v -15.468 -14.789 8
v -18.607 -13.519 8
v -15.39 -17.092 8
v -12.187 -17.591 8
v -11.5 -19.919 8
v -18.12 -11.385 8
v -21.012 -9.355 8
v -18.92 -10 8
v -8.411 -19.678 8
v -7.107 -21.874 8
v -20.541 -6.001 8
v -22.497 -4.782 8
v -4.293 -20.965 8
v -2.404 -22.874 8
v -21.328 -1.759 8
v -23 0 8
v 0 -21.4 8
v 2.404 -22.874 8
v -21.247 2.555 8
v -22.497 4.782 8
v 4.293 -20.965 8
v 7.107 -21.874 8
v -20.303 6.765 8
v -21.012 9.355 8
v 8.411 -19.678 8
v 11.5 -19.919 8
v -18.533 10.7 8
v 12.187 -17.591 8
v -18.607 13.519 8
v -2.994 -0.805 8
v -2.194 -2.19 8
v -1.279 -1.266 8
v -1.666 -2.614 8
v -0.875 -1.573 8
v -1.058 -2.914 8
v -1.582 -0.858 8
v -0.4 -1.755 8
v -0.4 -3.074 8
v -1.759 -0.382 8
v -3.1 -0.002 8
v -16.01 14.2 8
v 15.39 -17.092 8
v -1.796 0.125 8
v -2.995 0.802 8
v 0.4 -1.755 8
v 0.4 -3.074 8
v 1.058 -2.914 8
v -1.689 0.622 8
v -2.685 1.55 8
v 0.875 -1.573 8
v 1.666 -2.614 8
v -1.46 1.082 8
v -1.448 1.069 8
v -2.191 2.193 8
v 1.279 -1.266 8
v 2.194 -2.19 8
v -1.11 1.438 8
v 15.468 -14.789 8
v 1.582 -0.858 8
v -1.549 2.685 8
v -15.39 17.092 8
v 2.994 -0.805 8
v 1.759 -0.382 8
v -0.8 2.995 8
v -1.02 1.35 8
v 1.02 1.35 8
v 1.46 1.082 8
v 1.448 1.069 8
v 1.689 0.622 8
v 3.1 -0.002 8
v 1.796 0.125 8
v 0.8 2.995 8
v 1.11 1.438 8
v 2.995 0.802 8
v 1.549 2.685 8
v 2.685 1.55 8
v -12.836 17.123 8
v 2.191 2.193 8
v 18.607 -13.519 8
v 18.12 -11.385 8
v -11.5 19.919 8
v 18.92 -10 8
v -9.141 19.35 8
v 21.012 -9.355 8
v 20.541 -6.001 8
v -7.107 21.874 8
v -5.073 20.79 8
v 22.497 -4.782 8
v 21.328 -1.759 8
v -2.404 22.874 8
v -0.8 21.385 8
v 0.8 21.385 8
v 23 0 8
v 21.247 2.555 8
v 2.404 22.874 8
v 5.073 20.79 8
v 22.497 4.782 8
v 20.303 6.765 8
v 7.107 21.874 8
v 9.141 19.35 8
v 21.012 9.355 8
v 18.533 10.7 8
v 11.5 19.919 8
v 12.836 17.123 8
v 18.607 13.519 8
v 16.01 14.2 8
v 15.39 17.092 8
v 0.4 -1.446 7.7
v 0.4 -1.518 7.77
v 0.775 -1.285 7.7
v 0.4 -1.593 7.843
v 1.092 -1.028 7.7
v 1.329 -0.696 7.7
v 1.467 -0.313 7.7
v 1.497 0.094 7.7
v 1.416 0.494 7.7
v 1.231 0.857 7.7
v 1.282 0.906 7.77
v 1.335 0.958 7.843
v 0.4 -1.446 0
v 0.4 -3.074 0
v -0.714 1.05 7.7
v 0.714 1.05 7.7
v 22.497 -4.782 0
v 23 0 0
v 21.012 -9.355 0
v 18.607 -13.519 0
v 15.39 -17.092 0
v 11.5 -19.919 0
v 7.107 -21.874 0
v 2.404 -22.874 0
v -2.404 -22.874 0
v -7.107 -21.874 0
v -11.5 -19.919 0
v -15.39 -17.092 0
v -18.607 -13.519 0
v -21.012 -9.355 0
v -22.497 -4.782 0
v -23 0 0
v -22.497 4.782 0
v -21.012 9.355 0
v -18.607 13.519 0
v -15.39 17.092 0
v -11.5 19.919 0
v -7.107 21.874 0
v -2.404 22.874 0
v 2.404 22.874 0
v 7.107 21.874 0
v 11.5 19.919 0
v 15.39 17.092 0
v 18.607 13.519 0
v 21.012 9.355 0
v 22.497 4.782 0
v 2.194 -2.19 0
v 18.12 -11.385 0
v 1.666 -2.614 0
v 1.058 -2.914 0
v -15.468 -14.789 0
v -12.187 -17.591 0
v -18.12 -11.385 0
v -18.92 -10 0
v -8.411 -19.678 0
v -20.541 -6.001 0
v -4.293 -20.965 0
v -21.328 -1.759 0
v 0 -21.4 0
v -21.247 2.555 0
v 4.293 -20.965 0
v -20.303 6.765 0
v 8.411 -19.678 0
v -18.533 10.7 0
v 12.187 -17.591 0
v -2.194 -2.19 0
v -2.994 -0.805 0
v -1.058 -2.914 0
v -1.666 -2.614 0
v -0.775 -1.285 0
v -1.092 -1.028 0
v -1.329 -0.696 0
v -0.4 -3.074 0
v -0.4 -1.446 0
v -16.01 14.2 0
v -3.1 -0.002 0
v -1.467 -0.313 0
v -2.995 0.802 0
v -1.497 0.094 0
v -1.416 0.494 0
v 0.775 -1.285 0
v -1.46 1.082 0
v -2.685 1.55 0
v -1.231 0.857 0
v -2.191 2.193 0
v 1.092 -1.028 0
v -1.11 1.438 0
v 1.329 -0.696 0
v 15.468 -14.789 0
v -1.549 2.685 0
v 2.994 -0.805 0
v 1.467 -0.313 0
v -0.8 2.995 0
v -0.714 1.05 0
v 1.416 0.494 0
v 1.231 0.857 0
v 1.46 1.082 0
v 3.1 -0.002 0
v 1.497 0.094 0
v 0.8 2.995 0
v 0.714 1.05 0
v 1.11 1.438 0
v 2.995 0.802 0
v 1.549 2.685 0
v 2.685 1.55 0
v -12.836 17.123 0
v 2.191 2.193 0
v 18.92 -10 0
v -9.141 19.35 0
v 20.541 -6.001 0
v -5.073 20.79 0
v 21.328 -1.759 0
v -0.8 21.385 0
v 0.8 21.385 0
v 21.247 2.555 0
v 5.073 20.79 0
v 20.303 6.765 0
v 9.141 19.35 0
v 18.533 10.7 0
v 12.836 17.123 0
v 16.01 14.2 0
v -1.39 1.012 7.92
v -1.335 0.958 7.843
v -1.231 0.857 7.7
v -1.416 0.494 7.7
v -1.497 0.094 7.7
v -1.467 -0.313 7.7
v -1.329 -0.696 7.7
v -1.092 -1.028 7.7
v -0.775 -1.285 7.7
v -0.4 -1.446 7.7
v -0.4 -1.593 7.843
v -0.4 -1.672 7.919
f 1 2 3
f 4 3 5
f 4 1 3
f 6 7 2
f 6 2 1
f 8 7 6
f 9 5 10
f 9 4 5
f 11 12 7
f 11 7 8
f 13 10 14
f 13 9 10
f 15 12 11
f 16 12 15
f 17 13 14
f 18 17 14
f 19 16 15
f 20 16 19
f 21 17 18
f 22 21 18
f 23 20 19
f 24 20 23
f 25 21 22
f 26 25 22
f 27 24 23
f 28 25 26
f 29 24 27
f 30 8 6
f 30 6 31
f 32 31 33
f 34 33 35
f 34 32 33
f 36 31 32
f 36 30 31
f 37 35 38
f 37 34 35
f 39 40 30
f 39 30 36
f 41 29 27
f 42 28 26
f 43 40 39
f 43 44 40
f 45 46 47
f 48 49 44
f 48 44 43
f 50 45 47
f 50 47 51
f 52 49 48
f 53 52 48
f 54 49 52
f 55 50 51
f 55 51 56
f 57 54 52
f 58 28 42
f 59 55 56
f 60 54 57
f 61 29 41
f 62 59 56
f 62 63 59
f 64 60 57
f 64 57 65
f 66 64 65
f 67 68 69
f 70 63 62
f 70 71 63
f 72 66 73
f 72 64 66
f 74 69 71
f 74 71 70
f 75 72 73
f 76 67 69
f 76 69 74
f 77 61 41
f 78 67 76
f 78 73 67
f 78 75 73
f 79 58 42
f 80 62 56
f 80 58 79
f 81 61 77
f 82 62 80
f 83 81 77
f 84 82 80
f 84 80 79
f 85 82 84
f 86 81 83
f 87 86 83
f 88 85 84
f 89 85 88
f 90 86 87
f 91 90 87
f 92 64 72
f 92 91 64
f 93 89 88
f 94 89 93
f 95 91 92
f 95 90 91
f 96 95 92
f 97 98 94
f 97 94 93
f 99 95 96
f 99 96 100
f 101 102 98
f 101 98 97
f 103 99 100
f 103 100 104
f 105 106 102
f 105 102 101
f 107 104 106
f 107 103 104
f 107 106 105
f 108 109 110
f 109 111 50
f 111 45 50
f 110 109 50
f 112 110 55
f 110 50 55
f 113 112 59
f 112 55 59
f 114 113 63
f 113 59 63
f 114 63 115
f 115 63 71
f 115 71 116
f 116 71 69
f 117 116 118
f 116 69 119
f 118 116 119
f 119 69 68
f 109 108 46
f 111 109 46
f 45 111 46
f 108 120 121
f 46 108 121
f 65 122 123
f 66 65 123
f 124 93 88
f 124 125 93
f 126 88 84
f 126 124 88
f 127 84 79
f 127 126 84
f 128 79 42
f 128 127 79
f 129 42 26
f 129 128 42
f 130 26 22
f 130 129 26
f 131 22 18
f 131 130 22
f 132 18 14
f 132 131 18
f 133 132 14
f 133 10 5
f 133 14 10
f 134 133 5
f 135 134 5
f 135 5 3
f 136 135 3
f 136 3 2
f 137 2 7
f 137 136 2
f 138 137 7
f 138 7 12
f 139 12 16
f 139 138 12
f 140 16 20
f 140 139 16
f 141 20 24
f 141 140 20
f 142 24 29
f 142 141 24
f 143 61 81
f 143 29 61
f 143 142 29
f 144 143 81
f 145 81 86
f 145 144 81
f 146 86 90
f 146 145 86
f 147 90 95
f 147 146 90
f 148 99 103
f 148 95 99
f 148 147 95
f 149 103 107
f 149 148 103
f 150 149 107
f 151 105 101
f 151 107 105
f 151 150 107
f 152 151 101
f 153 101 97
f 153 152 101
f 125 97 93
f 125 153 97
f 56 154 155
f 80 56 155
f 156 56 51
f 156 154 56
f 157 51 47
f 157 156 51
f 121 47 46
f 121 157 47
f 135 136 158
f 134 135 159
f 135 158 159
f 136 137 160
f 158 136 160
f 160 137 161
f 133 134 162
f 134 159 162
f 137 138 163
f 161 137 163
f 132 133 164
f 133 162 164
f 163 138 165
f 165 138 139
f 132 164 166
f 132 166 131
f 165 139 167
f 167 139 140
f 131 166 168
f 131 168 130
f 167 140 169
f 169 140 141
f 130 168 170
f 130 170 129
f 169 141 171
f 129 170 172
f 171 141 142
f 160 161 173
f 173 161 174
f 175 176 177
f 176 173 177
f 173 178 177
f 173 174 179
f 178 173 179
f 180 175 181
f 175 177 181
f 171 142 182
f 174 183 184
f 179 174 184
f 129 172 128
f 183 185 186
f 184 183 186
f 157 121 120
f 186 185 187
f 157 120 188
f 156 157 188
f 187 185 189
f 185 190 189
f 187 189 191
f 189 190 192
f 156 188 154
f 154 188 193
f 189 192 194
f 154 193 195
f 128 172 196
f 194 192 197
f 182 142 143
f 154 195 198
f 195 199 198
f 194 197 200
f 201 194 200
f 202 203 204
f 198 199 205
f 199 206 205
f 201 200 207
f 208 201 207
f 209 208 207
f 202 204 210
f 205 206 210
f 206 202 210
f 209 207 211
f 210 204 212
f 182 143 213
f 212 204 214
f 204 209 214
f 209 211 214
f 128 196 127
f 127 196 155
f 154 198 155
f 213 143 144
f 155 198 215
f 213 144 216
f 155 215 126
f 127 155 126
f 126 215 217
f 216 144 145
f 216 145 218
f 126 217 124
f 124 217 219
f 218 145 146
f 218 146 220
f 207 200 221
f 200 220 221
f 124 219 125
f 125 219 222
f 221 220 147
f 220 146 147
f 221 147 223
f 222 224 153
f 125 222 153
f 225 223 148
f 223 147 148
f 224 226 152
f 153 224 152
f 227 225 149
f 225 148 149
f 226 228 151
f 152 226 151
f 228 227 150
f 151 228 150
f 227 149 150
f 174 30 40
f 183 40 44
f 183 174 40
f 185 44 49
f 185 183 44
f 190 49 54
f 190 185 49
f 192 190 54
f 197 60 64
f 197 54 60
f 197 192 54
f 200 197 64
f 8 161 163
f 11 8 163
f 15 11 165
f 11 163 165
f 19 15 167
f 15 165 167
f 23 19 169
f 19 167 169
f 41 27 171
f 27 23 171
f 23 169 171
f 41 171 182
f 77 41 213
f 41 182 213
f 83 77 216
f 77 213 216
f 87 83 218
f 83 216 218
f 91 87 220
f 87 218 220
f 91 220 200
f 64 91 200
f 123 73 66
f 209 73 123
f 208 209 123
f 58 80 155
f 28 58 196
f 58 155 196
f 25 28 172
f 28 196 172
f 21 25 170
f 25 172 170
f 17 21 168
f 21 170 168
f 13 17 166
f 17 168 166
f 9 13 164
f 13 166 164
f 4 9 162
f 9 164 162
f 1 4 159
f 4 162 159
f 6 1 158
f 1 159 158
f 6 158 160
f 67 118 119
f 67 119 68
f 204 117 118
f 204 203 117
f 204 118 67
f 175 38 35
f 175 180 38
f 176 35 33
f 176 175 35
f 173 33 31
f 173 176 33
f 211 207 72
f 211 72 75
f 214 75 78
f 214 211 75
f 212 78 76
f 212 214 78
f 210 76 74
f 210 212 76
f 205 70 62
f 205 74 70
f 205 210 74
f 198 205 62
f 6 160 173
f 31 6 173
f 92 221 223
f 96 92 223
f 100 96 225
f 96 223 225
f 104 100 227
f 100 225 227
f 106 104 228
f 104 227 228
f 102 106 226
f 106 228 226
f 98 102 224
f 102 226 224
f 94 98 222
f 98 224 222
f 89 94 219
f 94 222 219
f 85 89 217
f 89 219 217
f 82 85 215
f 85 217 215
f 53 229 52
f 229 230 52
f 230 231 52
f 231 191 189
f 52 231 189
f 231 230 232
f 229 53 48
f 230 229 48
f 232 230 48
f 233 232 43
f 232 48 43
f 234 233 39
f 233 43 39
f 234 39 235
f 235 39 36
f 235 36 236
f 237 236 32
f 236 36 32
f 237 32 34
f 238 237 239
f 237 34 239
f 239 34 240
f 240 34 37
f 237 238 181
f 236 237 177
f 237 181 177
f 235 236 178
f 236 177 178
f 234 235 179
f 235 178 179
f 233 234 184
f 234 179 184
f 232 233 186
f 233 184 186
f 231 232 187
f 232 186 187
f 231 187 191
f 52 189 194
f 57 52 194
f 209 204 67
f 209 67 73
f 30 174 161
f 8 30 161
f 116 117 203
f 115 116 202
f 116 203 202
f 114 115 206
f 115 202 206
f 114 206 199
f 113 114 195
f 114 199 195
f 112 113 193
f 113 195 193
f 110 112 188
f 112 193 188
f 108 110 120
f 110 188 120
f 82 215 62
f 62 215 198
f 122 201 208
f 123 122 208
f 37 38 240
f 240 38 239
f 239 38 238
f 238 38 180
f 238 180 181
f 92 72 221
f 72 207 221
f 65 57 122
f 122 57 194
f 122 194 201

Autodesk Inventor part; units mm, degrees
ref_plane "YZ Plane" through (0, 0, 0) normal (1, 0, 0) x (0, 1, 0)
ref_plane "XZ Plane" through (0, 0, 0) normal (0, 1, 0) x (-1, 0, 0)
ref_plane "XY Plane" through (0, 0, 0) normal (0, 0, 1) x (1, 0, 0)
sketch "スケッチ1" plane through (0, 0, 0) normal (0, 0, 1) x (1, 0, 0)
  circle A0 centre (0, 0) radius 1.5
  circle A1 centre (0, 0) radius 3.1
  line L0 (-0.4, 0) -> (0.4, 0)
  line L1 (0.4, 0) -> (0.4, -3.1)
  line L2 (0.4, -3.1) -> (-0.4, -3.1)
  line L3 (-0.4, -3.1) -> (-0.4, 0)
  line L4 (-1.0712, 1.05) -> (1.0712, 1.05)
  circle A2 centre (0, 0) radius 23
  circle A3 centre (0, 0) radius 21.4
  line L5 (-1.4605, 1.0815) -> (-1.1105, 1.4385)
  line L6 (-1.1105, 1.4385) -> (0.175, 0.1785)
  line L7 (0.175, 0.1785) -> (-0.175, -0.1785)
  line L8 (-0.175, -0.1785) -> (-1.4605, 1.0815)
  line L9 (1.4605, 1.0815) -> (1.1105, 1.4385)
  line L10 (1.1105, 1.4385) -> (-0.175, 0.1785)
  line L11 (-0.175, 0.1785) -> (0.175, -0.1785)
  line L12 (0.175, -0.1785) -> (1.4605, 1.0815)
  line L13 (0, 0) -> (-1.0712, 1.05) construction
  line L14 (1.0712, 1.05) -> (0, 0) construction
  point P0 (0.4, -1.4457)
  point P1 (0.4, -3.0741)
  point P2 (-0.4, -3.0741)
  point P3 (-0.4, -1.4457)
  point P4 (-0.7141, 1.05)
  point P5 (0.7141, 1.05)
  point P6 (1.2312, 0.8568)
  point P7 (-1.2312, 0.8568)
  dimension "SHAFT_D" = 3
  dimension "SLIT" = 0.8
  dimension "HUB_THIN" = 1.6
  dimension "d3" = 1.05
  dimension "WHEEL_D" = 46
  dimension "d5" = 1.6
  dimension "d18" = 0.5
  dimension "d19" = 1.8
extrude "ハブ＆リム" add sketch "スケッチ1" along normal blind 8 contours A0 L12 L9 L10 L6 L5 L8 L3 A1 L1 | L10 L4 L6 A0 | A2
sketch "スケッチ2" plane through (0, 0, 0) normal (0, 0, 1) x (1, 0, 0)
  line L0 (-0.8, 2.6) -> (0.8, 2.6)
  line L1 (0.8, 2.6) -> (0.8, 21.4)
  line L2 (0.8, 21.4) -> (-0.8, 21.4)
  line L3 (-0.8, 21.4) -> (-0.8, 2.6)
  circle A0 centre (0, 0) radius 21.4 projected
  point P0 (0, 21.4)
  dimension "d8" = 1.6
  dimension "d9" = 2.6
extrude "スポーク" add sketch "スケッチ2" along normal up to surface (8 mm away) contours L3 A0 L1 L0 | L3 L2 A0 | A0 L2 L1 picked at (0, 8.8667)
pattern_circular "円形状パターン1" count 3 over 360 about axis through (0, 0, -10) along (0, 0, 1) of "スポーク"
chamfer "面取り1" distance 0.3 angle 45 3 edges at (-1.4109, -0.5094, 8) (0, 1.05, 8) (1.4109, -0.5094, 8)
equation "\"d5\" = HUB_THIN"
properties part number "D-Shaft_Wheel2"
